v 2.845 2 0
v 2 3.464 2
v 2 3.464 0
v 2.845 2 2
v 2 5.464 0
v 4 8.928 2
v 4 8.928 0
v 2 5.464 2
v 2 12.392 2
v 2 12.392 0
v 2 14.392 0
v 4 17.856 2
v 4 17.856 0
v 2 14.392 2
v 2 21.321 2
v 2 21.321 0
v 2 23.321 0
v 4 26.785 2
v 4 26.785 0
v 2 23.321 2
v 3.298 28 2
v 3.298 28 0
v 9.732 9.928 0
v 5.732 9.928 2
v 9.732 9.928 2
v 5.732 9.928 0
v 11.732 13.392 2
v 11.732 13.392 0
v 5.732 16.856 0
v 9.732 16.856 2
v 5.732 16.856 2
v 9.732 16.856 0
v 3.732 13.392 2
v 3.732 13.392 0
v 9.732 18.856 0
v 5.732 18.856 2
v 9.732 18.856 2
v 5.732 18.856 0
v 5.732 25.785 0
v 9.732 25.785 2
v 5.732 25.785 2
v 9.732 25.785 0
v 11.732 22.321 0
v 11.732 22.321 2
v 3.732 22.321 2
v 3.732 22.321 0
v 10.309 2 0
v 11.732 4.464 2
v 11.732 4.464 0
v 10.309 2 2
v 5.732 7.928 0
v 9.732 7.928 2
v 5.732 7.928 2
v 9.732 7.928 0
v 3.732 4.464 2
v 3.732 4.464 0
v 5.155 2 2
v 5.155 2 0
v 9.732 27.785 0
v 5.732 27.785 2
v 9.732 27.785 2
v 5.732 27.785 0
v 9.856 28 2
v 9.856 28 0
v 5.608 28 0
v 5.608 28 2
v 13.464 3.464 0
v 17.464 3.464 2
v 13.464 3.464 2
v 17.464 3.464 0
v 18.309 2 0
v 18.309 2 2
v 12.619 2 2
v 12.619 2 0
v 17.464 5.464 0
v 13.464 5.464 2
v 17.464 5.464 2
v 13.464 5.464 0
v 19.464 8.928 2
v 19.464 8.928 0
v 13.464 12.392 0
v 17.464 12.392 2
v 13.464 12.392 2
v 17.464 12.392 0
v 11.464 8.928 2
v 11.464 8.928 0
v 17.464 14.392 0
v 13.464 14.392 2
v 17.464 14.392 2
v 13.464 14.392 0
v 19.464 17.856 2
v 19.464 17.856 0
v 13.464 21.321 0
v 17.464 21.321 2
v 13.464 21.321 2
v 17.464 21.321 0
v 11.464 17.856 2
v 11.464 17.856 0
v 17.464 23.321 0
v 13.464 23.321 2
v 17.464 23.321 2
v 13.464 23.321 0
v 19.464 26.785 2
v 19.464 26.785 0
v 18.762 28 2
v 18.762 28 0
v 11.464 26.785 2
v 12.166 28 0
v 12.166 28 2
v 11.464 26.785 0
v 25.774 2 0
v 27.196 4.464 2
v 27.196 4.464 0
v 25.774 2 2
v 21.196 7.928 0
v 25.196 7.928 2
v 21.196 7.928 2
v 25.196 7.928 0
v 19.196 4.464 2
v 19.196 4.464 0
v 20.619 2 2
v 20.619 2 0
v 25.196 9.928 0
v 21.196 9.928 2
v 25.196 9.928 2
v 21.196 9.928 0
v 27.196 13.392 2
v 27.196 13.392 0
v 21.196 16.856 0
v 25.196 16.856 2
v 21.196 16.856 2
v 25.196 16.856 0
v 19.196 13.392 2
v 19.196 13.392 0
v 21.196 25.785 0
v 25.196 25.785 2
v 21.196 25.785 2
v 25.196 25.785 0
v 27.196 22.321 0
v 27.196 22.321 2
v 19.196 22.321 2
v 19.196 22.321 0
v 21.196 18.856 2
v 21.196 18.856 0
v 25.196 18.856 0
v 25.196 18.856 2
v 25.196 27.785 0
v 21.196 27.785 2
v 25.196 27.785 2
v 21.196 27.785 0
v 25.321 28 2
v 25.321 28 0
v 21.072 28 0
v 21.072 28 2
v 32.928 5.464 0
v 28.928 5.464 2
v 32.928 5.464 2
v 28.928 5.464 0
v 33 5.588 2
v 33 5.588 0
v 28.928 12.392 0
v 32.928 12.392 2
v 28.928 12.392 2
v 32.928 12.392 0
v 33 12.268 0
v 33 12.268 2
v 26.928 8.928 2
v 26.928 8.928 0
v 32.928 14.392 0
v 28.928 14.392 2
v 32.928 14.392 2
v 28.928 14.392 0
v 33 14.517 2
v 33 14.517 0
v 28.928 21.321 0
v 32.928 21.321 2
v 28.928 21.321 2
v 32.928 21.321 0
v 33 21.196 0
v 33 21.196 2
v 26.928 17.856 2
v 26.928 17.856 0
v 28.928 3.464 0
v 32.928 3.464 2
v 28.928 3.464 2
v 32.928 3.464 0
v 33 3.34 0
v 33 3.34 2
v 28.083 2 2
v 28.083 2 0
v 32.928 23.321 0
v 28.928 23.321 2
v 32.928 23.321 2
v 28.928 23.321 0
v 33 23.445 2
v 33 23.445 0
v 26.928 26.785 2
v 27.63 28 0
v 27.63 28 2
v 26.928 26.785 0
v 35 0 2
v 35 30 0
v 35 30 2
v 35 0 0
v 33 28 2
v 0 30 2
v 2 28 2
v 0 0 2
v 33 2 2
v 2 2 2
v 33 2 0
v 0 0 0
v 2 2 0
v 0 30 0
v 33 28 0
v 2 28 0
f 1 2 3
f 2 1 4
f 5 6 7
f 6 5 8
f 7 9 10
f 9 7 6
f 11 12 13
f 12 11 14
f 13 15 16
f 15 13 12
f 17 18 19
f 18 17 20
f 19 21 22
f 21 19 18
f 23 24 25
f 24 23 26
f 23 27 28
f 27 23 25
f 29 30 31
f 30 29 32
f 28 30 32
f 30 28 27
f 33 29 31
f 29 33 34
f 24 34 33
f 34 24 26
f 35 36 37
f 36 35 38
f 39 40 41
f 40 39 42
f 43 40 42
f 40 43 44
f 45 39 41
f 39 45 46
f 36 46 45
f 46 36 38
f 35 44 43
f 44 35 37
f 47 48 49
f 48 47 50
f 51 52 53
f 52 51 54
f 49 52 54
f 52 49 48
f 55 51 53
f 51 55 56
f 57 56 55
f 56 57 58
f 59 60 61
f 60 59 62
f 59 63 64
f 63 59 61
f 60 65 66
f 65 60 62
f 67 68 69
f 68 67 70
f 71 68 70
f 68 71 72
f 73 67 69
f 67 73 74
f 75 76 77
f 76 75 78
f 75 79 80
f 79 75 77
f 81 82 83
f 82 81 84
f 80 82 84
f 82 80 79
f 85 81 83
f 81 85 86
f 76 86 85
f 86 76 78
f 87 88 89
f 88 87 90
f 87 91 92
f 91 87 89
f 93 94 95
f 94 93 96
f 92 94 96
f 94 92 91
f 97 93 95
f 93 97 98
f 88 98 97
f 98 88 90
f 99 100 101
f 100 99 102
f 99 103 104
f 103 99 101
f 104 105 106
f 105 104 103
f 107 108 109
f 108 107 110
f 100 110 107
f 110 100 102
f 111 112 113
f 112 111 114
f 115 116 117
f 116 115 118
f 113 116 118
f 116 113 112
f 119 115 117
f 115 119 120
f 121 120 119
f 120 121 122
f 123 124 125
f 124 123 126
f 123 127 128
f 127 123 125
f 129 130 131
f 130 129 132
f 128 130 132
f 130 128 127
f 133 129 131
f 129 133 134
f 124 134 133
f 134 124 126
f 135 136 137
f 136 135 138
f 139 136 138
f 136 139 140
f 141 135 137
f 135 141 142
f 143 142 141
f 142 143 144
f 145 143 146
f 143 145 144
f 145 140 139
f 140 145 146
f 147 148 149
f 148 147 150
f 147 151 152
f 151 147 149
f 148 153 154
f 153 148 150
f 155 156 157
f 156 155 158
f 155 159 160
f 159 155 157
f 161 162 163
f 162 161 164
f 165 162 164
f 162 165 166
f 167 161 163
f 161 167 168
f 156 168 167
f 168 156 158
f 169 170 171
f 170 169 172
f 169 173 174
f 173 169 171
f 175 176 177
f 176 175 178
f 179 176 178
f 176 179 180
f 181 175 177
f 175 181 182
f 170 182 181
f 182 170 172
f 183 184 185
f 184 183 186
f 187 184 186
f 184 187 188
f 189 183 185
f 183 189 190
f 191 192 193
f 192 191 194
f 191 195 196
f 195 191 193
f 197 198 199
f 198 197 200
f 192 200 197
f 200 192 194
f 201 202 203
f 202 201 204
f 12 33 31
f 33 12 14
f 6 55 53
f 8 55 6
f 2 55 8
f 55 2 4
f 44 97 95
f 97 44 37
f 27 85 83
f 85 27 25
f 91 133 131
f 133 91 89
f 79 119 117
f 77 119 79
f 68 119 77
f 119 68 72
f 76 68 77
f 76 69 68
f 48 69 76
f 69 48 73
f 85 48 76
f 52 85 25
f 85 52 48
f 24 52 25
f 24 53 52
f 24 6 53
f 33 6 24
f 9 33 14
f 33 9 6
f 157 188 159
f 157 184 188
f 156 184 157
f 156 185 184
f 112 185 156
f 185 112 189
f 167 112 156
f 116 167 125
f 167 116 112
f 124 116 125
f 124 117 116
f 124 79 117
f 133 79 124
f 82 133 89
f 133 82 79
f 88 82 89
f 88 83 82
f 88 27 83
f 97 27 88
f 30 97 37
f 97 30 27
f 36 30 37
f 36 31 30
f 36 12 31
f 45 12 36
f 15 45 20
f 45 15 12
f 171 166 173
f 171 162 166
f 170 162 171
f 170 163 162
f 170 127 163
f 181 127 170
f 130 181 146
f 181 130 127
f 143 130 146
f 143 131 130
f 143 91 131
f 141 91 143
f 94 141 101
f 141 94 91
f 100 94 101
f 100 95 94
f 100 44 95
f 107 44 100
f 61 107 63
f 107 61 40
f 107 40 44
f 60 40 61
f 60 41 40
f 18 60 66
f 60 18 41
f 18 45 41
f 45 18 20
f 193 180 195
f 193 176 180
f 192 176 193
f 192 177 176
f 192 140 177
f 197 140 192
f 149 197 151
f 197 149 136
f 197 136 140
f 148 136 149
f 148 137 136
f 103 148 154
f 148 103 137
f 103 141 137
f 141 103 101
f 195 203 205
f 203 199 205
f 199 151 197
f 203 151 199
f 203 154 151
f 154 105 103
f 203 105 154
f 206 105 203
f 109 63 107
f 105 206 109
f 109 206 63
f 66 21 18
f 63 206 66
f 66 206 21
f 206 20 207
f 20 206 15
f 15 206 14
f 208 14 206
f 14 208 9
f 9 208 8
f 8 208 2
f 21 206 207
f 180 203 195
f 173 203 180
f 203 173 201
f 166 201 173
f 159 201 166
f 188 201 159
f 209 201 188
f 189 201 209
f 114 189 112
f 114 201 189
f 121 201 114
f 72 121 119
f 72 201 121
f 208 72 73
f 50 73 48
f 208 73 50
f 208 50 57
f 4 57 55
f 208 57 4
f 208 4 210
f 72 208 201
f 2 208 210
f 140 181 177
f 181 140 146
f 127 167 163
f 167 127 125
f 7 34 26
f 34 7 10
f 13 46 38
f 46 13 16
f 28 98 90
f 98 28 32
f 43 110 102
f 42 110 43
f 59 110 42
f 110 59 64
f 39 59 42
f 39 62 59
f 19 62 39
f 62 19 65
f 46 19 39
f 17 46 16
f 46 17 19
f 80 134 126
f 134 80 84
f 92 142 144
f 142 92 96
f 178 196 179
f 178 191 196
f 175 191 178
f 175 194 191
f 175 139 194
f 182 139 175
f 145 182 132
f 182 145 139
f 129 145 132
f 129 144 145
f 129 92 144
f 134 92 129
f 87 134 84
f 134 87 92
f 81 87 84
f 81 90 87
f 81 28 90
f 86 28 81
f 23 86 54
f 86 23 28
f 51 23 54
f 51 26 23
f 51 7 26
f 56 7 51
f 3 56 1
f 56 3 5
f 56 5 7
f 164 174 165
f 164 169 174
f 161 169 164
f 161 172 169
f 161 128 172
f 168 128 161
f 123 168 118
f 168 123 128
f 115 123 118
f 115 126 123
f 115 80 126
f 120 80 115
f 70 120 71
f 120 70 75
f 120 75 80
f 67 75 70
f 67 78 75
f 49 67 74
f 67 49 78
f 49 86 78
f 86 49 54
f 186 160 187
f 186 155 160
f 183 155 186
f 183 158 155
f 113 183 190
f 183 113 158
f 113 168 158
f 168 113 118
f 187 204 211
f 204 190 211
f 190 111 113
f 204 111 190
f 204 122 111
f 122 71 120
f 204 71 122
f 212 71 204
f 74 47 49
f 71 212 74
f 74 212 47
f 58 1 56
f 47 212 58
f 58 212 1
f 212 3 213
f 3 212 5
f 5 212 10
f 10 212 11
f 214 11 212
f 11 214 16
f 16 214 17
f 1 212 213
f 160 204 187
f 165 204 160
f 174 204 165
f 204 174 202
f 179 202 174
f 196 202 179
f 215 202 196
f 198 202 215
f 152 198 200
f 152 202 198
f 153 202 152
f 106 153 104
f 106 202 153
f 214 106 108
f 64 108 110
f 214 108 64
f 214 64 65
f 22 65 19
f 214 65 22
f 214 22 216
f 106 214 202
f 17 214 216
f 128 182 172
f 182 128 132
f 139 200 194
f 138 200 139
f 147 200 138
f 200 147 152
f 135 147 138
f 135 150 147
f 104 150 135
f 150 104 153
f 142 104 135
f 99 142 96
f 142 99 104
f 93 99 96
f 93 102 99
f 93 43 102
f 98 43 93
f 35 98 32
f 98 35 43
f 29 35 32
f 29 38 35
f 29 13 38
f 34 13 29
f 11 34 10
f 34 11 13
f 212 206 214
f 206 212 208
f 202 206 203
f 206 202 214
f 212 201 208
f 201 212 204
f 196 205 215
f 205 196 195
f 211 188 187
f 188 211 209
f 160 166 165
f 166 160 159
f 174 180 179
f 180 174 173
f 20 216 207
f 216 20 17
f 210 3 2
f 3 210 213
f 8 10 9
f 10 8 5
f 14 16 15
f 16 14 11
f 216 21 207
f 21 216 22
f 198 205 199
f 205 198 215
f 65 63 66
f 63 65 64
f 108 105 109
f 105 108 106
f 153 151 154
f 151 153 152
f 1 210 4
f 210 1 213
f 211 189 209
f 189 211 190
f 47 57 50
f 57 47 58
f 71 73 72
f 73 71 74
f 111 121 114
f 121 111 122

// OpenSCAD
union() {
	difference() {
		cube(size = [35, 30, 2]);
		translate(v = [0, 0, -1]) {
			union() {
				union() {
					union() {
						union() {
							union() {
								translate(v = [0.0, 0.0, 0.0]) {
									cylinder($fn = 6, h = 4, r = 4);
								}
								translate(v = [0.0, 8.92820323028, 0.0]) {
									cylinder($fn = 6, h = 4, r = 4);
								}
							}
							union() {
								translate(v = [0.0, 17.8564064606, 0.0]) {
									cylinder($fn = 6, h = 4, r = 4);
								}
								translate(v = [0.0, 26.7846096908, 0.0]) {
									cylinder($fn = 6, h = 4, r = 4);
								}
							}
						}
						union() {
							union() {
								translate(v = [0.0, 35.7128129211, 0.0]) {
									cylinder($fn = 6, h = 4, r = 4);
								}
								translate(v = [7.73205080757, -4.46410161514, 0.0]) {
									cylinder($fn = 6, h = 4, r = 4);
								}
							}
							union() {
								translate(v = [7.73205080757, 4.46410161514, 0.0]) {
									cylinder($fn = 6, h = 4, r = 4);
								}
								union() {
									translate(v = [7.73205080757, 13.3923048454, 0.0]) {
										cylinder($fn = 6, h = 4, r = 4);
									}
									translate(v = [7.73205080757, 22.3205080757, 0.0]) {
										cylinder($fn = 6, h = 4, r = 4);
									}
								}
							}
						}
					}
					union() {
						union() {
							union() {
								translate(v = [7.73205080757, 31.248711306, 0.0]) {
									cylinder($fn = 6, h = 4, r = 4);
								}
								translate(v = [15.4641016151, -8.92820323028, 0.0]) {
									cylinder($fn = 6, h = 4, r = 4);
								}
							}
							union() {
								translate(v = [15.4641016151, 0.0, 0.0]) {
									cylinder($fn = 6, h = 4, r = 4);
								}
								translate(v = [15.4641016151, 8.92820323028, 0.0]) {
									cylinder($fn = 6, h = 4, r = 4);
								}
							}
						}
						union() {
							union() {
								translate(v = [15.4641016151, 17.8564064606, 0.0]) {
									cylinder($fn = 6, h = 4, r = 4);
								}
								translate(v = [15.4641016151, 26.7846096908, 0.0]) {
									cylinder($fn = 6, h = 4, r = 4);
								}
							}
							union() {
								translate(v = [15.4641016151, 35.7128129211, 0.0]) {
									cylinder($fn = 6, h = 4, r = 4);
								}
								union() {
									translate(v = [23.1961524227, -13.3923048454, 0.0]) {
										cylinder($fn = 6, h = 4, r = 4);
									}
									translate(v = [23.1961524227, -4.46410161514, 0.0]) {
										cylinder($fn = 6, h = 4, r = 4);
									}
								}
							}
						}
					}
				}
				union() {
					union() {
						union() {
							union() {
								translate(v = [23.1961524227, 4.46410161514, 0.0]) {
									cylinder($fn = 6, h = 4, r = 4);
								}
								translate(v = [23.1961524227, 13.3923048454, 0.0]) {
									cylinder($fn = 6, h = 4, r = 4);
								}
							}
							union() {
								translate(v = [23.1961524227, 22.3205080757, 0.0]) {
									cylinder($fn = 6, h = 4, r = 4);
								}
								translate(v = [23.1961524227, 31.248711306, 0.0]) {
									cylinder($fn = 6, h = 4, r = 4);
								}
							}
						}
						union() {
							union() {
								translate(v = [30.9282032303, -17.8564064606, 0.0]) {
									cylinder($fn = 6, h = 4, r = 4);
								}
								translate(v = [30.9282032303, -8.92820323028, 0.0]) {
									cylinder($fn = 6, h = 4, r = 4);
								}
							}
							union() {
								translate(v = [30.9282032303, 0.0, 0.0]) {
									cylinder($fn = 6, h = 4, r = 4);
								}
								union() {
									translate(v = [30.9282032303, 8.92820323028, 0.0]) {
										cylinder($fn = 6, h = 4, r = 4);
									}
									translate(v = [30.9282032303, 17.8564064606, 0.0]) {
										cylinder($fn = 6, h = 4, r = 4);
									}
								}
							}
						}
					}
					union() {
						union() {
							union() {
								translate(v = [30.9282032303, 26.7846096908, 0.0]) {
									cylinder($fn = 6, h = 4, r = 4);
								}
								translate(v = [30.9282032303, 35.7128129211, 0.0]) {
									cylinder($fn = 6, h = 4, r = 4);
								}
							}
							union() {
								translate(v = [38.6602540378, -22.3205080757, 0.0]) {
									cylinder($fn = 6, h = 4, r = 4);
								}
								translate(v = [38.6602540378, -13.3923048454, 0.0]) {
									cylinder($fn = 6, h = 4, r = 4);
								}
							}
						}
						union() {
							union() {
								translate(v = [38.6602540378, -4.46410161514, 0.0]) {
									cylinder($fn = 6, h = 4, r = 4);
								}
								translate(v = [38.6602540378, 4.46410161514, 0.0]) {
									cylinder($fn = 6, h = 4, r = 4);
								}
							}
							union() {
								translate(v = [38.6602540378, 13.3923048454, 0.0]) {
									cylinder($fn = 6, h = 4, r = 4);
								}
								union() {
									translate(v = [38.6602540378, 22.3205080757, 0.0]) {
										cylinder($fn = 6, h = 4, r = 4);
									}
									translate(v = [38.6602540378, 31.248711306, 0.0]) {
										cylinder($fn = 6, h = 4, r = 4);
									}
								}
							}
						}
					}
				}
			}
		}
	}
	difference() {
		cube(size = [35, 30, 2]);
		translate(v = [2, 2, -1]) {
			cube(size = [31, 26, 4]);
		}
	}
}
